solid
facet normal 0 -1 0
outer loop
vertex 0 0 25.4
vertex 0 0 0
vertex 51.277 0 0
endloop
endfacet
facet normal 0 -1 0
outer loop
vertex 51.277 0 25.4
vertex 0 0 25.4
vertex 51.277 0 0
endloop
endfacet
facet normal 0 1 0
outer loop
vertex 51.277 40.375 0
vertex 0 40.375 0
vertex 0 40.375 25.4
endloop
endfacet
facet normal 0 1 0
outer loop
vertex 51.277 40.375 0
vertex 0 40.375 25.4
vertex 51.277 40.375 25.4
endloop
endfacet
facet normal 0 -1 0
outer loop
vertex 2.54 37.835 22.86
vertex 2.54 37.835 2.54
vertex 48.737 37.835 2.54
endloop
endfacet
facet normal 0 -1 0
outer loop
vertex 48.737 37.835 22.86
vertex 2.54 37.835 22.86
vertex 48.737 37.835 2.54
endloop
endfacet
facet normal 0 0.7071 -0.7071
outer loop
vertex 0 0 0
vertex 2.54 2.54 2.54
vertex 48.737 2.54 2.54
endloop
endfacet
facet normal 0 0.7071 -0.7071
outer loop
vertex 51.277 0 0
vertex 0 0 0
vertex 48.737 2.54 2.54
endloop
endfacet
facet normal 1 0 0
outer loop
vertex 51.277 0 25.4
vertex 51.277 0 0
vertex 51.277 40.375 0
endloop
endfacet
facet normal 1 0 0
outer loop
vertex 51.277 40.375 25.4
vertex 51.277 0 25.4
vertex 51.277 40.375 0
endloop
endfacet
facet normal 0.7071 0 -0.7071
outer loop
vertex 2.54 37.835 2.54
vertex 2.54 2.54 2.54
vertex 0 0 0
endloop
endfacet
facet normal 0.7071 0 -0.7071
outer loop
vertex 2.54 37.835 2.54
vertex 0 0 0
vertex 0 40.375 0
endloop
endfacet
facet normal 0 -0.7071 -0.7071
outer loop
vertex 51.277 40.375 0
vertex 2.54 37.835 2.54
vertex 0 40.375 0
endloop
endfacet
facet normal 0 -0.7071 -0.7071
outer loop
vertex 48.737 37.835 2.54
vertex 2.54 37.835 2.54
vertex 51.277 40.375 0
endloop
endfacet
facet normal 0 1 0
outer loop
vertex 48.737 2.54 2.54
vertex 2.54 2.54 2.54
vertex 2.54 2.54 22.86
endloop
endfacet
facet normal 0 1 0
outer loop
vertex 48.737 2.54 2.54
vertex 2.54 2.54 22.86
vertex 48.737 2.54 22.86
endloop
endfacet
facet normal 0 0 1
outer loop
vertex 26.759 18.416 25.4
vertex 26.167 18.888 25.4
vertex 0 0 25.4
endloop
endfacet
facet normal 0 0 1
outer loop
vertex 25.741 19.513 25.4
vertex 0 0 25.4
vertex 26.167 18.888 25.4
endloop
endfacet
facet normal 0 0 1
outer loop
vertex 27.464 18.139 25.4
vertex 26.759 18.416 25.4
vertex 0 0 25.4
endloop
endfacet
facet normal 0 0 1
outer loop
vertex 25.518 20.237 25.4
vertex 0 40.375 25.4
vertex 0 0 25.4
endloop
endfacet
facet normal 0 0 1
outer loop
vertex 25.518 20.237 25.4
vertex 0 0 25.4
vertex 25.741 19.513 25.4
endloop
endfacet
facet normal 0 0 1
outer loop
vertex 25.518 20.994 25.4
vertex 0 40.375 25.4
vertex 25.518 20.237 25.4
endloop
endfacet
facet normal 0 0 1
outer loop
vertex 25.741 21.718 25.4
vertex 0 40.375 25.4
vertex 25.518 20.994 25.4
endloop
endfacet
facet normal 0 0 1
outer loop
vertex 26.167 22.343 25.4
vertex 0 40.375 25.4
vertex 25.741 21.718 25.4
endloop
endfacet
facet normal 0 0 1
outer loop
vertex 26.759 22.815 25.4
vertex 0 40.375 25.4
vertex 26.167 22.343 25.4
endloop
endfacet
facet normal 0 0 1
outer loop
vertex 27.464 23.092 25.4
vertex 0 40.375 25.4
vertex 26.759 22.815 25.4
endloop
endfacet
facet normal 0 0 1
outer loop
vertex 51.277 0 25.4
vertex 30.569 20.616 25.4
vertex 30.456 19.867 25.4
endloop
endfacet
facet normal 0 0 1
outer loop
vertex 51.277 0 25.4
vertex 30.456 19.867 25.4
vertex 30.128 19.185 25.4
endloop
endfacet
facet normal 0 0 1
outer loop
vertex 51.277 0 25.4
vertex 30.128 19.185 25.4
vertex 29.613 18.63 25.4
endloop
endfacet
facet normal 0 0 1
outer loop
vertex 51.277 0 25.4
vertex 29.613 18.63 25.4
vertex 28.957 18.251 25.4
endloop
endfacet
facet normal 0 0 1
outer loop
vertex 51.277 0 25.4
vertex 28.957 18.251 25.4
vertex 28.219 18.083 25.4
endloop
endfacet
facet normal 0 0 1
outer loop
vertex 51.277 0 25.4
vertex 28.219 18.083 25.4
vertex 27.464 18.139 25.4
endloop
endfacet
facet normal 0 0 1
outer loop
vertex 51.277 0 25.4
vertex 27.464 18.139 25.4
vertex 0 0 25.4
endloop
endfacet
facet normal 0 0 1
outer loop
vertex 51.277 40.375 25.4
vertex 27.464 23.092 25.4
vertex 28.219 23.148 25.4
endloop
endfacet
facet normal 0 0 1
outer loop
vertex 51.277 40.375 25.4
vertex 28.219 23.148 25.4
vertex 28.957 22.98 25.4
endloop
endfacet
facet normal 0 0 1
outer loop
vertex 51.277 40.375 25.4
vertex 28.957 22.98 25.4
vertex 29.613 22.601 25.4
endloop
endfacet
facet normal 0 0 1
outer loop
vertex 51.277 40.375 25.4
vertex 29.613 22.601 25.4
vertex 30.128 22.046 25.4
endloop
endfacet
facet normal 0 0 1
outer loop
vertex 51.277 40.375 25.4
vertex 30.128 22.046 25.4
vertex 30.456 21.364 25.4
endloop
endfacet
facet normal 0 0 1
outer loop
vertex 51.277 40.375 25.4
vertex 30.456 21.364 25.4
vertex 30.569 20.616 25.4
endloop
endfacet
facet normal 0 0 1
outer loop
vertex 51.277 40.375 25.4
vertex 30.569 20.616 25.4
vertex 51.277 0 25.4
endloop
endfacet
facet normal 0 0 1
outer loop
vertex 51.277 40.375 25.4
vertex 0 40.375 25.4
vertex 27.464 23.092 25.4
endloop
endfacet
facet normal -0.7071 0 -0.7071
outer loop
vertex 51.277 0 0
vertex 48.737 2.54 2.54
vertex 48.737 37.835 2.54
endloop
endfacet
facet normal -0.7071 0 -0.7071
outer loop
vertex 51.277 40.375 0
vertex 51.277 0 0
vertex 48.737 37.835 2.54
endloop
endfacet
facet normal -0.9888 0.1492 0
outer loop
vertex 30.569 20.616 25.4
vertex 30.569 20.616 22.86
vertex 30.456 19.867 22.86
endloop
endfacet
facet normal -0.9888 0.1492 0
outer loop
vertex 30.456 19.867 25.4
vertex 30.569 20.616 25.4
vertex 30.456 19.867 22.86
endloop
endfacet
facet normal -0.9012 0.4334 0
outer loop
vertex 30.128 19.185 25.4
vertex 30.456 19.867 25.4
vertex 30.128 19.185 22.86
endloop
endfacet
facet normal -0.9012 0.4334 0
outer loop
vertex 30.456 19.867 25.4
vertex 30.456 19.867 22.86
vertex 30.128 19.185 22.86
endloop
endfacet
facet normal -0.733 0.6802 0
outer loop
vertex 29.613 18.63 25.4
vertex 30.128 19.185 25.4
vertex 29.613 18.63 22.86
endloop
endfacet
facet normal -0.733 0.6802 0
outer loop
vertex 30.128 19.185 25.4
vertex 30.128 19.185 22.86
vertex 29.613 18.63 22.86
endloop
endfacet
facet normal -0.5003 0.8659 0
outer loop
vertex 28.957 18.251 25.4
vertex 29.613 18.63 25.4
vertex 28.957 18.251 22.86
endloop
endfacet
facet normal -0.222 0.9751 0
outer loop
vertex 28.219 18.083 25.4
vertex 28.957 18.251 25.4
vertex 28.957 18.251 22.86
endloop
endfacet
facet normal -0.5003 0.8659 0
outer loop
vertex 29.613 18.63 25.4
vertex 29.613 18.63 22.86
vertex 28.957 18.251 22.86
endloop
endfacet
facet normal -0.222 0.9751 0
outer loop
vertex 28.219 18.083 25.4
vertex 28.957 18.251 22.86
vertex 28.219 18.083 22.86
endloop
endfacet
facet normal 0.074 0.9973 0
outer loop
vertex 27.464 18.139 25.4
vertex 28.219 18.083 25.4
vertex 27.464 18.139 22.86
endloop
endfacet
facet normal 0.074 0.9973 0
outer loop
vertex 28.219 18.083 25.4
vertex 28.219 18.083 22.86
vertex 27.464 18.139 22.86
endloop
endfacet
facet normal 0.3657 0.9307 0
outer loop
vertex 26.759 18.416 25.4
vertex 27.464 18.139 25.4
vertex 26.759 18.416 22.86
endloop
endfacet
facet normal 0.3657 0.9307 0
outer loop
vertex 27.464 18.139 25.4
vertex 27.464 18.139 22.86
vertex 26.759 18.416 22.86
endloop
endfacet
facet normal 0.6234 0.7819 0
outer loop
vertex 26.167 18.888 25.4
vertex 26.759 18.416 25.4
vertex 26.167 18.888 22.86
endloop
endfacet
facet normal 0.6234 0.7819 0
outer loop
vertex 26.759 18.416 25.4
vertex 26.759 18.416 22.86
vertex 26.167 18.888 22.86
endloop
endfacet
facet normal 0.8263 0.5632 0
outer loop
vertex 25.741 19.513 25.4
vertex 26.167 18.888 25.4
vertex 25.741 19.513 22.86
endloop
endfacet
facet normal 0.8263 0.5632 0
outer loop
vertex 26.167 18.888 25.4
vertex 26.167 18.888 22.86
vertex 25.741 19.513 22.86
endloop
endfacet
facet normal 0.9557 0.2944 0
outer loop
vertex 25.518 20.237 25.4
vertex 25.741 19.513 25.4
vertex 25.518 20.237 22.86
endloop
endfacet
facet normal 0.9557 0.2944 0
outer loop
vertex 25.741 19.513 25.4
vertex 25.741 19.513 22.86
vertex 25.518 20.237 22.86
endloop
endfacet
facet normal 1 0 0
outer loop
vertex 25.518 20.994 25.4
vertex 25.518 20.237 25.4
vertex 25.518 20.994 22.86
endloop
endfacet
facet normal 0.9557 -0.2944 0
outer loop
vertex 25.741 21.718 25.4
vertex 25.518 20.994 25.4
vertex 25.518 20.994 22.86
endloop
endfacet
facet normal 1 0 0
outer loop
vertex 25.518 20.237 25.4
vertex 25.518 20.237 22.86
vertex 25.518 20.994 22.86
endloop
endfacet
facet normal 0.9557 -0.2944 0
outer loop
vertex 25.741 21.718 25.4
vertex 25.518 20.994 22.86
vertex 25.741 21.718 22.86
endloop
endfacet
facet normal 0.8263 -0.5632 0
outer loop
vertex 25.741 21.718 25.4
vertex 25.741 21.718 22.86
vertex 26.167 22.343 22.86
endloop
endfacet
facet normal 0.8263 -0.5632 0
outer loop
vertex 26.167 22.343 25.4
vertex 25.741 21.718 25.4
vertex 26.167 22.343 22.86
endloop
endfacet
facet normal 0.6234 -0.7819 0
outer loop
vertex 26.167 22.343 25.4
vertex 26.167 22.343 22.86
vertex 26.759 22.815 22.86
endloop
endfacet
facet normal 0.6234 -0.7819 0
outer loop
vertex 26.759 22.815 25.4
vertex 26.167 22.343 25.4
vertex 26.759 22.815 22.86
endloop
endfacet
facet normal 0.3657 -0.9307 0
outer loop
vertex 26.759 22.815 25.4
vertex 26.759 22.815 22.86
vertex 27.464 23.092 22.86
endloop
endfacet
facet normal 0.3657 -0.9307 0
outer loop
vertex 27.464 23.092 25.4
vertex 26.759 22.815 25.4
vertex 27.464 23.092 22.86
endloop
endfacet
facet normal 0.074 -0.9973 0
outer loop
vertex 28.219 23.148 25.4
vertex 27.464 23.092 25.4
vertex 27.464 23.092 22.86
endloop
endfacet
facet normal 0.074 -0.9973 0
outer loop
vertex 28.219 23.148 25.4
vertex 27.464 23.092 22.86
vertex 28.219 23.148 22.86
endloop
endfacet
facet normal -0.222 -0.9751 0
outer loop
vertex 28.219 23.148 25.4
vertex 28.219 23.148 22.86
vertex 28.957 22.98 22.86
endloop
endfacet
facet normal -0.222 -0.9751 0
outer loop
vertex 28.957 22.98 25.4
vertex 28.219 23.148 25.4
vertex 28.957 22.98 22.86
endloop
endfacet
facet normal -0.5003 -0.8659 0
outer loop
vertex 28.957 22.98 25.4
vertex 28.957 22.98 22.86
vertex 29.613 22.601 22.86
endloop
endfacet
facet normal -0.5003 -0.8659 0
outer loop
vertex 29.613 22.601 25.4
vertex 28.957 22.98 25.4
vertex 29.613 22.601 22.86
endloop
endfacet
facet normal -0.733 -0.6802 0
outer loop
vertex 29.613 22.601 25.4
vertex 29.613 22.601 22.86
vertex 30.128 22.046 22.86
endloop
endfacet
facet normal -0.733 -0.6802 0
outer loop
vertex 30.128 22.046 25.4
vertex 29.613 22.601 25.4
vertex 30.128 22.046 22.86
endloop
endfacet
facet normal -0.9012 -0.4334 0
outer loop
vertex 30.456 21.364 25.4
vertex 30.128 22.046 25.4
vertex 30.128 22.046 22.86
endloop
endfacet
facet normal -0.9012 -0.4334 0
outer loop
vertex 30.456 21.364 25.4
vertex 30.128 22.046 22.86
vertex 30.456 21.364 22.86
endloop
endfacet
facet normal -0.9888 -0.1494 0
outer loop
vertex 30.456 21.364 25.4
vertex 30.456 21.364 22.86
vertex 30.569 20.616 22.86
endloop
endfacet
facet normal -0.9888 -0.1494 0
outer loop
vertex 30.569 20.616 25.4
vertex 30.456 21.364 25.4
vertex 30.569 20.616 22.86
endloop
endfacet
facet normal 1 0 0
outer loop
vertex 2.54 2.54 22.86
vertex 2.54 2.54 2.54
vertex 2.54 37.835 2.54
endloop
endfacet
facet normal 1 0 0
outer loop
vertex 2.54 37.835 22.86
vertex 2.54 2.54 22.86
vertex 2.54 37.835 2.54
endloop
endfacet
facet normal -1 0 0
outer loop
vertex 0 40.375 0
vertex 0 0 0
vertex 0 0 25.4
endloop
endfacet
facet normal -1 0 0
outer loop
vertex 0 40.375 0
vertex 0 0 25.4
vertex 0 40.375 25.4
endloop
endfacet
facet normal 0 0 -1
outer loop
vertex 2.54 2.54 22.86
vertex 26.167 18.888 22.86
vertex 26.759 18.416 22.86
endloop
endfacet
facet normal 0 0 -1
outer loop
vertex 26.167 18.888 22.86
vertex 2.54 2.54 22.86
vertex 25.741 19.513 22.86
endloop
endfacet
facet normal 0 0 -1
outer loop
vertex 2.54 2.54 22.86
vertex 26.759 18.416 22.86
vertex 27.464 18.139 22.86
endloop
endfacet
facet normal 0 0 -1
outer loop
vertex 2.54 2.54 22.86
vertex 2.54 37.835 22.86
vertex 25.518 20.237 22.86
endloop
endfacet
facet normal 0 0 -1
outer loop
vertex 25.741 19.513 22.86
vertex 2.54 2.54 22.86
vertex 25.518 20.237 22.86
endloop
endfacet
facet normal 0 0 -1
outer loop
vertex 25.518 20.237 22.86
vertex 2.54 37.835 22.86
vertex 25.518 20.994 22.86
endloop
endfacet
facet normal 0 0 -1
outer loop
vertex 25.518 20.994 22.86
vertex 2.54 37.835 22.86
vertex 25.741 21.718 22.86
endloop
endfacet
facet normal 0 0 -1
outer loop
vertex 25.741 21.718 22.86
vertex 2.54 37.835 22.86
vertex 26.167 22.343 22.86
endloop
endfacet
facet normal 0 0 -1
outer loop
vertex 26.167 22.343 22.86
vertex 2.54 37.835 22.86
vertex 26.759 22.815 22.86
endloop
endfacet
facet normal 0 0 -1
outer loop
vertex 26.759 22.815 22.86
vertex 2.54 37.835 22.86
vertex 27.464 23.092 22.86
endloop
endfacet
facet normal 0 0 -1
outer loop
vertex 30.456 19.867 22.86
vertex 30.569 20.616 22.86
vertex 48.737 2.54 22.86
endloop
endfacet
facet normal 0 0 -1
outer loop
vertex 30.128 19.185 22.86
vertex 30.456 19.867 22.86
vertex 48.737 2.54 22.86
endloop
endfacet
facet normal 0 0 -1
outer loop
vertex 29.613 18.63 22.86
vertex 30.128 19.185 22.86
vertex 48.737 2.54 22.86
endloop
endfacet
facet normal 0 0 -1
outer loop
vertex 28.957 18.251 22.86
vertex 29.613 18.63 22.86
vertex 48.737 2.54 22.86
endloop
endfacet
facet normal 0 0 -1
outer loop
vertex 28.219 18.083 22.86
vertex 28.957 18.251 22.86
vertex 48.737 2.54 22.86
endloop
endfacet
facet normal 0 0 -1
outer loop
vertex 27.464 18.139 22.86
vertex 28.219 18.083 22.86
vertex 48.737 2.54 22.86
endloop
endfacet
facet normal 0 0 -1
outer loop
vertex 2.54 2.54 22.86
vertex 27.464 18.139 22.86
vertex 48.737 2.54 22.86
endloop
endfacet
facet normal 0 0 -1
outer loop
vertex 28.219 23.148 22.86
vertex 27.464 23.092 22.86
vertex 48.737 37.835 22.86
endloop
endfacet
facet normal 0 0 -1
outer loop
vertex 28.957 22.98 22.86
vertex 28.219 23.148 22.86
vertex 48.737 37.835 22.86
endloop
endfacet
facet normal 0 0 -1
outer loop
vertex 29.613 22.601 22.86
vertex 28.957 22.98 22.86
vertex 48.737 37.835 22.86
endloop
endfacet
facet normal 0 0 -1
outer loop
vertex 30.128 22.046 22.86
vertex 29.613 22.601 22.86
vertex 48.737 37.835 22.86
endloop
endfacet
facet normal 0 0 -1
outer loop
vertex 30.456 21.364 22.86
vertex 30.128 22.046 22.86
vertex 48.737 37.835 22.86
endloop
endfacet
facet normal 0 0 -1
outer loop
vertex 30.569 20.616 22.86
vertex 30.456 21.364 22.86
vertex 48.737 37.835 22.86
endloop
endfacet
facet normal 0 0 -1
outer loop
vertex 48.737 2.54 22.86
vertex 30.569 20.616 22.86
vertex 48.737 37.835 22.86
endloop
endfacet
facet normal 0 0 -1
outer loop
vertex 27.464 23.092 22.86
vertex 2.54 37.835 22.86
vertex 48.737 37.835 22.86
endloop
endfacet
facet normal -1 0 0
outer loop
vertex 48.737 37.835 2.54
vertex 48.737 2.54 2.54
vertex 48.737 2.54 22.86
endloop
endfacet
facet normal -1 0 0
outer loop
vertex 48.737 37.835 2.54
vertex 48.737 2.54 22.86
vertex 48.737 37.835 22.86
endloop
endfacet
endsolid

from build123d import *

# Parameters (mm, degrees)
F0_W           = 51.2767769396
F0_H           = 40.3746776283
F1_DEPTH       = 25.4
F2_W           = 14.1758769751
F2_H           = 15.7698839903
F3_DEPTH       = 12.7
F4_T           = -2.54
F5_SIZE        = 2.53999
F7_D           = 2.54
F7_CBORE_D     = 5.08
F7_CBORE_DEPTH = 2.54


# Not quite as in the source:
# - a fillet or chamfer is up to 0.001 mm smaller than in the source, because OpenCascade refuses the exact size


with BuildPart() as f1:
    # F0 (on Top) → F1 (new body)
    with BuildSketch(Plane.XY):
        with Locations((25.6383884698, 20.1873388141)):
            Rectangle(F0_W, F0_H)
    extrude(amount=F1_DEPTH)

    # F2 (on face) → F3 (join)
    with BuildSketch(Plane.XY.offset(25.4)):
        with Locations((19.3085148931, 20.5943360925)):
            Rectangle(F2_W, F2_H)
    extrude(amount=-F3_DEPTH)

    # F4
    f4_openings = [f1.faces().sort_by_distance(p)[0] for p in [
        (25.638388, 20.187339, 0),
    ]]
    offset(amount=F4_T, openings=f4_openings)

    # F5 (size 2.54 in the source; OpenCascade refuses exactly that, so slightly less here)
    f5_edges = [f1.edges().sort_by_distance(p)[0] for p in [
        (2.54, 20.187339, 0),
        (25.638388, 37.834678, 0),
        (48.736777, 20.187339, 0),
        (25.638388, 2.54, 0),
    ]]
    chamfer(f5_edges, length=F5_SIZE)

    # F7 (through all)
    with Locations(Plane(origin=(0, 0, 22.86), x_dir=(1, 0, 0), z_dir=(0, 0, -1))):
        with Locations((28.0292164534, -20.6155125052)):
            CounterBoreHole(F7_D / 2, F7_CBORE_D / 2, F7_CBORE_DEPTH)


solid = f1.part
